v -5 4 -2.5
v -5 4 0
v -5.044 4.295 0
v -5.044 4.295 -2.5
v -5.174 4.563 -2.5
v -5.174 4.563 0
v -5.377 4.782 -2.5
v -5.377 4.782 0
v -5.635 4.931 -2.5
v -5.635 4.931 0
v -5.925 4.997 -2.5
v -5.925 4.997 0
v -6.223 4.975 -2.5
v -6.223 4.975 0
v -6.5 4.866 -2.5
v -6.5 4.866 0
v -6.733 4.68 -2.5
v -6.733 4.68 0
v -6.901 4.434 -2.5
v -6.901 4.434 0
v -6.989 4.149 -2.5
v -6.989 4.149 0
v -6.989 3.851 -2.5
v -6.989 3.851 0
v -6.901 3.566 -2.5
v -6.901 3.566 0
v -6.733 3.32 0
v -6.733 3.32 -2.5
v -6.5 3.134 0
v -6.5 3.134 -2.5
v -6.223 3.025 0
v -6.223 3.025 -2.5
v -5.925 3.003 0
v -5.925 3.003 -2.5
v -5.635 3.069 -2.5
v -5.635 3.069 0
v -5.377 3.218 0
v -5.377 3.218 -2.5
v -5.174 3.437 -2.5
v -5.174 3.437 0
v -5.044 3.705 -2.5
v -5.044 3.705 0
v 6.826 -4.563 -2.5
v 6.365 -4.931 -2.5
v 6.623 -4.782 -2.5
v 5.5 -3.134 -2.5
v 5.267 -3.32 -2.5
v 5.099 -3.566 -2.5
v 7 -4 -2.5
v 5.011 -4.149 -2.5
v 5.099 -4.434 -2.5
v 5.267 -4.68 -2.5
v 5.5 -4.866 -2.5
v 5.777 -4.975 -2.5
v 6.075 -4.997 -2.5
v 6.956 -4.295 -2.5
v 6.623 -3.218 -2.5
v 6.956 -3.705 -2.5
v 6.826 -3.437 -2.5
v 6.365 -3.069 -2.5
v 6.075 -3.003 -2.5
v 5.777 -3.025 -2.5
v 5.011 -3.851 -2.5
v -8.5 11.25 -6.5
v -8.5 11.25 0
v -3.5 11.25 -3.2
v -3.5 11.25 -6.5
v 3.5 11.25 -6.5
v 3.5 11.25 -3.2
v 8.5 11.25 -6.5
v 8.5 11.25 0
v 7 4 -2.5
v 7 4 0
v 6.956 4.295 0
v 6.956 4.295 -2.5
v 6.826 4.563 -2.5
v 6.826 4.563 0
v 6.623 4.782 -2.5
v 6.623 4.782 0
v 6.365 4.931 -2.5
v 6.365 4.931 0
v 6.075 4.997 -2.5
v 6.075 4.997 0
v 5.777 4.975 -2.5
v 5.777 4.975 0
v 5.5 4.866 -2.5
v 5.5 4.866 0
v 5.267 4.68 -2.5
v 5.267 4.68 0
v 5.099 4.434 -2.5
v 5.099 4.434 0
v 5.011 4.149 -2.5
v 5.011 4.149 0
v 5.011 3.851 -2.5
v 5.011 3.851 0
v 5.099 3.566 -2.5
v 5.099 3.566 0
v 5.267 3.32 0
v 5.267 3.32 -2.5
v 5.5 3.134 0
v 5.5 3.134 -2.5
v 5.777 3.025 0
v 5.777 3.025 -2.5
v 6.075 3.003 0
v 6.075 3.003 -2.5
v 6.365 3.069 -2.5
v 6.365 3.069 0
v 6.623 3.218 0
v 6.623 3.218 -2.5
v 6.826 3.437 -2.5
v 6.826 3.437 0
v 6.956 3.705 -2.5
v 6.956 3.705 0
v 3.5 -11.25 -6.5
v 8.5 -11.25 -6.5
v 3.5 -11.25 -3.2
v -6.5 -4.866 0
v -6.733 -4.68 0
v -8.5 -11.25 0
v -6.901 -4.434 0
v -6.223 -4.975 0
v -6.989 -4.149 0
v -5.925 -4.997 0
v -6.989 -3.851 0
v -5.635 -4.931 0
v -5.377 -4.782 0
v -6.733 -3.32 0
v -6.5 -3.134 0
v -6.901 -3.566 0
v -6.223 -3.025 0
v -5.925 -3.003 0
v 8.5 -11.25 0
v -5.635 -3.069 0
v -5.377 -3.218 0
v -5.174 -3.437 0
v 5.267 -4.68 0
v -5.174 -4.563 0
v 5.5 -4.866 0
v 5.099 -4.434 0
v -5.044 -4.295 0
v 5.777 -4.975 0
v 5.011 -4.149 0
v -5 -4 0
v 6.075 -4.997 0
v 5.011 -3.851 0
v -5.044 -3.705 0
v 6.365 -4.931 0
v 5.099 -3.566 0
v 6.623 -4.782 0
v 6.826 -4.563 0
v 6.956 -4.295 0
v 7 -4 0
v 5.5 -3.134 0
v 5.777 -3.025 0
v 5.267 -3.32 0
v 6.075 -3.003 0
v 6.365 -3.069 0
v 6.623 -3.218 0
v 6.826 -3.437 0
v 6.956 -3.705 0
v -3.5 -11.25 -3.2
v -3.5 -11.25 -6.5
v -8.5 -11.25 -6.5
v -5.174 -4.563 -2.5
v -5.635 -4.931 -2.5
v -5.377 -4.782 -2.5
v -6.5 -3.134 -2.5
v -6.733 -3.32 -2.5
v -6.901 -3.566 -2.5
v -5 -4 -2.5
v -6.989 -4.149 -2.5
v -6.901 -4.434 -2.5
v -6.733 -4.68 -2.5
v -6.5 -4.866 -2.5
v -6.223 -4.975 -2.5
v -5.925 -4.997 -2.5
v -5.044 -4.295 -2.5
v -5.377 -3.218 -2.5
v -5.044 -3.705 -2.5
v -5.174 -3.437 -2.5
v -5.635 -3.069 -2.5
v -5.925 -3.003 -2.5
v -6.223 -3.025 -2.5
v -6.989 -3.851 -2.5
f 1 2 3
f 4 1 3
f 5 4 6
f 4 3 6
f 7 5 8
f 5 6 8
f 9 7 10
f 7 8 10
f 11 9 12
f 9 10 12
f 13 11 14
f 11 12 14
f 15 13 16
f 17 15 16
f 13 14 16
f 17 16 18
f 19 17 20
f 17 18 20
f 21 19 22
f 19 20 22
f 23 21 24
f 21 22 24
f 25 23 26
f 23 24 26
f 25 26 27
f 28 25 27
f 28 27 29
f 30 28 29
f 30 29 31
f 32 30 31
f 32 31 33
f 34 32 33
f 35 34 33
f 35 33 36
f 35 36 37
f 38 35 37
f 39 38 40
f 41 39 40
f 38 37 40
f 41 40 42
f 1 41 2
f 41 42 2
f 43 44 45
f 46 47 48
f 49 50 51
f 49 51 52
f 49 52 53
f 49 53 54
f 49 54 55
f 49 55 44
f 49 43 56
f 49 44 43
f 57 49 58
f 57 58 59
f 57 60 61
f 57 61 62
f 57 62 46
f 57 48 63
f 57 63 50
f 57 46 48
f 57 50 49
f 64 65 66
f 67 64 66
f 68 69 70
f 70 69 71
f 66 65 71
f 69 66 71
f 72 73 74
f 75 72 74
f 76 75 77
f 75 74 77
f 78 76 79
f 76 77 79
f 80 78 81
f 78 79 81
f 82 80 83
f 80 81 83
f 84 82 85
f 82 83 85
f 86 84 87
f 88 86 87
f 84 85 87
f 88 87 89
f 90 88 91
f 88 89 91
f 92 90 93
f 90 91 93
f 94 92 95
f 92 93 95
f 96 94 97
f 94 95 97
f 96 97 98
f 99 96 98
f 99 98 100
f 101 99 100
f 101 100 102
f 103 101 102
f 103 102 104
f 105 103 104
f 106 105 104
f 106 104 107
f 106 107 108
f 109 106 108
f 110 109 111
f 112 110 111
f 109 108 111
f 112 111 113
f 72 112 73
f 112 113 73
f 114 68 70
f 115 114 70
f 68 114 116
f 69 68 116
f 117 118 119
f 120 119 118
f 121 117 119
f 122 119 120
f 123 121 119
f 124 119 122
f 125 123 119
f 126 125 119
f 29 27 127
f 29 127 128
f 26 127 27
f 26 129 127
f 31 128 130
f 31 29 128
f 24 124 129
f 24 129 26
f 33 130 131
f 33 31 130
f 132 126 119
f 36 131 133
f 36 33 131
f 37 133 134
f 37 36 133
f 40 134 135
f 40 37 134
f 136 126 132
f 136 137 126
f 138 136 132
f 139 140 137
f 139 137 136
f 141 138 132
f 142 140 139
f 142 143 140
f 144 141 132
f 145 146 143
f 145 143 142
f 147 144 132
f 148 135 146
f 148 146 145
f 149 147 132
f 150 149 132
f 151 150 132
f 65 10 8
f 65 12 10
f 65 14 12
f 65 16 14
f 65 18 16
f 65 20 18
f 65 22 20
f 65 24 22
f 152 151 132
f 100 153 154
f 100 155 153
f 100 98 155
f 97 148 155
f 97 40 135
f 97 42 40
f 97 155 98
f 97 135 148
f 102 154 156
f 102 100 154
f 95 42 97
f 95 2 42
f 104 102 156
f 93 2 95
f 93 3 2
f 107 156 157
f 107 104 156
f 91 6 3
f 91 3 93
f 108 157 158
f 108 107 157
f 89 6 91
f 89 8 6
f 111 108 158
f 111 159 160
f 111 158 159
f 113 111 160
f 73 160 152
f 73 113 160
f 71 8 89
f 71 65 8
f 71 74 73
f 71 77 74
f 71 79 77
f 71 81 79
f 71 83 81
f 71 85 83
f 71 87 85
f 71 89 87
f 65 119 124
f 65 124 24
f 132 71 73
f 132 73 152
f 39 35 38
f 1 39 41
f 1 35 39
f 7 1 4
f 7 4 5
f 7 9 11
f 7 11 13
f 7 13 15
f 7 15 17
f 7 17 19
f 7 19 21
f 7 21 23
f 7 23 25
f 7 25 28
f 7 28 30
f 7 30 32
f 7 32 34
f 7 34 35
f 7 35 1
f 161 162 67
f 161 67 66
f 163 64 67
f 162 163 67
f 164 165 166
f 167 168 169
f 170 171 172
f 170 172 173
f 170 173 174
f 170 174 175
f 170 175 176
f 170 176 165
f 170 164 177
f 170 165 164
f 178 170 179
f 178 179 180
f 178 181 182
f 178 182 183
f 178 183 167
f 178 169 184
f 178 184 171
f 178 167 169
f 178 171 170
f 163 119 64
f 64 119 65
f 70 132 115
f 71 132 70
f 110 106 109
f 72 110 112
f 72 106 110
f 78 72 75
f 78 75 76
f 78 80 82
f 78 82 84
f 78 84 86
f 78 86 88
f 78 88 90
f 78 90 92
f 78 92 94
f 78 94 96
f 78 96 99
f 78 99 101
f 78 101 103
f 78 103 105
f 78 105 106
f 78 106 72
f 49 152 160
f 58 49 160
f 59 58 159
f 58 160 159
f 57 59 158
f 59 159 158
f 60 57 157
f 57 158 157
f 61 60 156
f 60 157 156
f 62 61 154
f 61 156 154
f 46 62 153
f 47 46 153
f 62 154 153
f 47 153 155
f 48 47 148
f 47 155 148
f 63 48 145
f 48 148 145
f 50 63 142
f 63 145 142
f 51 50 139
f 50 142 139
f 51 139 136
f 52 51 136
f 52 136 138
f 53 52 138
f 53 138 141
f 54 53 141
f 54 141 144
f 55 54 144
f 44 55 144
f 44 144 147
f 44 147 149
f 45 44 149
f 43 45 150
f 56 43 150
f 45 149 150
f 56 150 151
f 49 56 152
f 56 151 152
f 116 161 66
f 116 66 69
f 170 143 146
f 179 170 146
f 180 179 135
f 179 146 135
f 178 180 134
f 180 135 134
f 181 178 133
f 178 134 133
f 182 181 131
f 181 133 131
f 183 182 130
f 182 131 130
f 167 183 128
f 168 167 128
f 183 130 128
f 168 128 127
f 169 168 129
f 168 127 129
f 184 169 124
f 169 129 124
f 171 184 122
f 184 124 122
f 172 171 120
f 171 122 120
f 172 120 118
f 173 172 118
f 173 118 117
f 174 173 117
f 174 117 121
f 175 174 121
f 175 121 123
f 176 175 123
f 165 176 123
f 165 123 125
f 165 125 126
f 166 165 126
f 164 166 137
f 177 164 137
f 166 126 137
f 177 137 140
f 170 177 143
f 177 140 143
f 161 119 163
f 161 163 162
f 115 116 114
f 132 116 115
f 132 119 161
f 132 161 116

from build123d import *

# Parameters (mm, degrees)
SKETCH1_W           = 17
SKETCH1_H           = 22.5
BOSS_EXTRUDE1_DEPTH = 6.5
SKETCH2_R           = 1
CUT_EXTRUDE1_DEPTH  = 2.5
SKETCH3_W           = 7
SKETCH3_H           = 6.6
CUT_EXTRUDE2_DEPTH  = 25.914855007


with BuildPart() as part:
    # Sketch1 → Boss-Extrude1 (new body)
    with BuildSketch(Plane.XY):
        Rectangle(SKETCH1_W, SKETCH1_H)
    extrude(amount=-BOSS_EXTRUDE1_DEPTH)

    # Sketch2 → Cut-Extrude1 (cut)
    with BuildSketch(Plane.XY):
        with Locations((6, 4)):
            Circle(SKETCH2_R)
        with Locations((6, -4)):
            Circle(SKETCH2_R)
        with Locations((-6, -4)):
            Circle(SKETCH2_R)
        with Locations((-6, 4)):
            Circle(SKETCH2_R)
    extrude(amount=-CUT_EXTRUDE1_DEPTH, mode=Mode.SUBTRACT)

    # Sketch3 → Cut-Extrude2 (cut, through all)
    with BuildSketch(Plane.XZ.offset(11.25)):
        with Locations((0, -6.5)):
            Rectangle(SKETCH3_W, SKETCH3_H)
    extrude(amount=-CUT_EXTRUDE2_DEPTH, mode=Mode.SUBTRACT)


solid = part.part
